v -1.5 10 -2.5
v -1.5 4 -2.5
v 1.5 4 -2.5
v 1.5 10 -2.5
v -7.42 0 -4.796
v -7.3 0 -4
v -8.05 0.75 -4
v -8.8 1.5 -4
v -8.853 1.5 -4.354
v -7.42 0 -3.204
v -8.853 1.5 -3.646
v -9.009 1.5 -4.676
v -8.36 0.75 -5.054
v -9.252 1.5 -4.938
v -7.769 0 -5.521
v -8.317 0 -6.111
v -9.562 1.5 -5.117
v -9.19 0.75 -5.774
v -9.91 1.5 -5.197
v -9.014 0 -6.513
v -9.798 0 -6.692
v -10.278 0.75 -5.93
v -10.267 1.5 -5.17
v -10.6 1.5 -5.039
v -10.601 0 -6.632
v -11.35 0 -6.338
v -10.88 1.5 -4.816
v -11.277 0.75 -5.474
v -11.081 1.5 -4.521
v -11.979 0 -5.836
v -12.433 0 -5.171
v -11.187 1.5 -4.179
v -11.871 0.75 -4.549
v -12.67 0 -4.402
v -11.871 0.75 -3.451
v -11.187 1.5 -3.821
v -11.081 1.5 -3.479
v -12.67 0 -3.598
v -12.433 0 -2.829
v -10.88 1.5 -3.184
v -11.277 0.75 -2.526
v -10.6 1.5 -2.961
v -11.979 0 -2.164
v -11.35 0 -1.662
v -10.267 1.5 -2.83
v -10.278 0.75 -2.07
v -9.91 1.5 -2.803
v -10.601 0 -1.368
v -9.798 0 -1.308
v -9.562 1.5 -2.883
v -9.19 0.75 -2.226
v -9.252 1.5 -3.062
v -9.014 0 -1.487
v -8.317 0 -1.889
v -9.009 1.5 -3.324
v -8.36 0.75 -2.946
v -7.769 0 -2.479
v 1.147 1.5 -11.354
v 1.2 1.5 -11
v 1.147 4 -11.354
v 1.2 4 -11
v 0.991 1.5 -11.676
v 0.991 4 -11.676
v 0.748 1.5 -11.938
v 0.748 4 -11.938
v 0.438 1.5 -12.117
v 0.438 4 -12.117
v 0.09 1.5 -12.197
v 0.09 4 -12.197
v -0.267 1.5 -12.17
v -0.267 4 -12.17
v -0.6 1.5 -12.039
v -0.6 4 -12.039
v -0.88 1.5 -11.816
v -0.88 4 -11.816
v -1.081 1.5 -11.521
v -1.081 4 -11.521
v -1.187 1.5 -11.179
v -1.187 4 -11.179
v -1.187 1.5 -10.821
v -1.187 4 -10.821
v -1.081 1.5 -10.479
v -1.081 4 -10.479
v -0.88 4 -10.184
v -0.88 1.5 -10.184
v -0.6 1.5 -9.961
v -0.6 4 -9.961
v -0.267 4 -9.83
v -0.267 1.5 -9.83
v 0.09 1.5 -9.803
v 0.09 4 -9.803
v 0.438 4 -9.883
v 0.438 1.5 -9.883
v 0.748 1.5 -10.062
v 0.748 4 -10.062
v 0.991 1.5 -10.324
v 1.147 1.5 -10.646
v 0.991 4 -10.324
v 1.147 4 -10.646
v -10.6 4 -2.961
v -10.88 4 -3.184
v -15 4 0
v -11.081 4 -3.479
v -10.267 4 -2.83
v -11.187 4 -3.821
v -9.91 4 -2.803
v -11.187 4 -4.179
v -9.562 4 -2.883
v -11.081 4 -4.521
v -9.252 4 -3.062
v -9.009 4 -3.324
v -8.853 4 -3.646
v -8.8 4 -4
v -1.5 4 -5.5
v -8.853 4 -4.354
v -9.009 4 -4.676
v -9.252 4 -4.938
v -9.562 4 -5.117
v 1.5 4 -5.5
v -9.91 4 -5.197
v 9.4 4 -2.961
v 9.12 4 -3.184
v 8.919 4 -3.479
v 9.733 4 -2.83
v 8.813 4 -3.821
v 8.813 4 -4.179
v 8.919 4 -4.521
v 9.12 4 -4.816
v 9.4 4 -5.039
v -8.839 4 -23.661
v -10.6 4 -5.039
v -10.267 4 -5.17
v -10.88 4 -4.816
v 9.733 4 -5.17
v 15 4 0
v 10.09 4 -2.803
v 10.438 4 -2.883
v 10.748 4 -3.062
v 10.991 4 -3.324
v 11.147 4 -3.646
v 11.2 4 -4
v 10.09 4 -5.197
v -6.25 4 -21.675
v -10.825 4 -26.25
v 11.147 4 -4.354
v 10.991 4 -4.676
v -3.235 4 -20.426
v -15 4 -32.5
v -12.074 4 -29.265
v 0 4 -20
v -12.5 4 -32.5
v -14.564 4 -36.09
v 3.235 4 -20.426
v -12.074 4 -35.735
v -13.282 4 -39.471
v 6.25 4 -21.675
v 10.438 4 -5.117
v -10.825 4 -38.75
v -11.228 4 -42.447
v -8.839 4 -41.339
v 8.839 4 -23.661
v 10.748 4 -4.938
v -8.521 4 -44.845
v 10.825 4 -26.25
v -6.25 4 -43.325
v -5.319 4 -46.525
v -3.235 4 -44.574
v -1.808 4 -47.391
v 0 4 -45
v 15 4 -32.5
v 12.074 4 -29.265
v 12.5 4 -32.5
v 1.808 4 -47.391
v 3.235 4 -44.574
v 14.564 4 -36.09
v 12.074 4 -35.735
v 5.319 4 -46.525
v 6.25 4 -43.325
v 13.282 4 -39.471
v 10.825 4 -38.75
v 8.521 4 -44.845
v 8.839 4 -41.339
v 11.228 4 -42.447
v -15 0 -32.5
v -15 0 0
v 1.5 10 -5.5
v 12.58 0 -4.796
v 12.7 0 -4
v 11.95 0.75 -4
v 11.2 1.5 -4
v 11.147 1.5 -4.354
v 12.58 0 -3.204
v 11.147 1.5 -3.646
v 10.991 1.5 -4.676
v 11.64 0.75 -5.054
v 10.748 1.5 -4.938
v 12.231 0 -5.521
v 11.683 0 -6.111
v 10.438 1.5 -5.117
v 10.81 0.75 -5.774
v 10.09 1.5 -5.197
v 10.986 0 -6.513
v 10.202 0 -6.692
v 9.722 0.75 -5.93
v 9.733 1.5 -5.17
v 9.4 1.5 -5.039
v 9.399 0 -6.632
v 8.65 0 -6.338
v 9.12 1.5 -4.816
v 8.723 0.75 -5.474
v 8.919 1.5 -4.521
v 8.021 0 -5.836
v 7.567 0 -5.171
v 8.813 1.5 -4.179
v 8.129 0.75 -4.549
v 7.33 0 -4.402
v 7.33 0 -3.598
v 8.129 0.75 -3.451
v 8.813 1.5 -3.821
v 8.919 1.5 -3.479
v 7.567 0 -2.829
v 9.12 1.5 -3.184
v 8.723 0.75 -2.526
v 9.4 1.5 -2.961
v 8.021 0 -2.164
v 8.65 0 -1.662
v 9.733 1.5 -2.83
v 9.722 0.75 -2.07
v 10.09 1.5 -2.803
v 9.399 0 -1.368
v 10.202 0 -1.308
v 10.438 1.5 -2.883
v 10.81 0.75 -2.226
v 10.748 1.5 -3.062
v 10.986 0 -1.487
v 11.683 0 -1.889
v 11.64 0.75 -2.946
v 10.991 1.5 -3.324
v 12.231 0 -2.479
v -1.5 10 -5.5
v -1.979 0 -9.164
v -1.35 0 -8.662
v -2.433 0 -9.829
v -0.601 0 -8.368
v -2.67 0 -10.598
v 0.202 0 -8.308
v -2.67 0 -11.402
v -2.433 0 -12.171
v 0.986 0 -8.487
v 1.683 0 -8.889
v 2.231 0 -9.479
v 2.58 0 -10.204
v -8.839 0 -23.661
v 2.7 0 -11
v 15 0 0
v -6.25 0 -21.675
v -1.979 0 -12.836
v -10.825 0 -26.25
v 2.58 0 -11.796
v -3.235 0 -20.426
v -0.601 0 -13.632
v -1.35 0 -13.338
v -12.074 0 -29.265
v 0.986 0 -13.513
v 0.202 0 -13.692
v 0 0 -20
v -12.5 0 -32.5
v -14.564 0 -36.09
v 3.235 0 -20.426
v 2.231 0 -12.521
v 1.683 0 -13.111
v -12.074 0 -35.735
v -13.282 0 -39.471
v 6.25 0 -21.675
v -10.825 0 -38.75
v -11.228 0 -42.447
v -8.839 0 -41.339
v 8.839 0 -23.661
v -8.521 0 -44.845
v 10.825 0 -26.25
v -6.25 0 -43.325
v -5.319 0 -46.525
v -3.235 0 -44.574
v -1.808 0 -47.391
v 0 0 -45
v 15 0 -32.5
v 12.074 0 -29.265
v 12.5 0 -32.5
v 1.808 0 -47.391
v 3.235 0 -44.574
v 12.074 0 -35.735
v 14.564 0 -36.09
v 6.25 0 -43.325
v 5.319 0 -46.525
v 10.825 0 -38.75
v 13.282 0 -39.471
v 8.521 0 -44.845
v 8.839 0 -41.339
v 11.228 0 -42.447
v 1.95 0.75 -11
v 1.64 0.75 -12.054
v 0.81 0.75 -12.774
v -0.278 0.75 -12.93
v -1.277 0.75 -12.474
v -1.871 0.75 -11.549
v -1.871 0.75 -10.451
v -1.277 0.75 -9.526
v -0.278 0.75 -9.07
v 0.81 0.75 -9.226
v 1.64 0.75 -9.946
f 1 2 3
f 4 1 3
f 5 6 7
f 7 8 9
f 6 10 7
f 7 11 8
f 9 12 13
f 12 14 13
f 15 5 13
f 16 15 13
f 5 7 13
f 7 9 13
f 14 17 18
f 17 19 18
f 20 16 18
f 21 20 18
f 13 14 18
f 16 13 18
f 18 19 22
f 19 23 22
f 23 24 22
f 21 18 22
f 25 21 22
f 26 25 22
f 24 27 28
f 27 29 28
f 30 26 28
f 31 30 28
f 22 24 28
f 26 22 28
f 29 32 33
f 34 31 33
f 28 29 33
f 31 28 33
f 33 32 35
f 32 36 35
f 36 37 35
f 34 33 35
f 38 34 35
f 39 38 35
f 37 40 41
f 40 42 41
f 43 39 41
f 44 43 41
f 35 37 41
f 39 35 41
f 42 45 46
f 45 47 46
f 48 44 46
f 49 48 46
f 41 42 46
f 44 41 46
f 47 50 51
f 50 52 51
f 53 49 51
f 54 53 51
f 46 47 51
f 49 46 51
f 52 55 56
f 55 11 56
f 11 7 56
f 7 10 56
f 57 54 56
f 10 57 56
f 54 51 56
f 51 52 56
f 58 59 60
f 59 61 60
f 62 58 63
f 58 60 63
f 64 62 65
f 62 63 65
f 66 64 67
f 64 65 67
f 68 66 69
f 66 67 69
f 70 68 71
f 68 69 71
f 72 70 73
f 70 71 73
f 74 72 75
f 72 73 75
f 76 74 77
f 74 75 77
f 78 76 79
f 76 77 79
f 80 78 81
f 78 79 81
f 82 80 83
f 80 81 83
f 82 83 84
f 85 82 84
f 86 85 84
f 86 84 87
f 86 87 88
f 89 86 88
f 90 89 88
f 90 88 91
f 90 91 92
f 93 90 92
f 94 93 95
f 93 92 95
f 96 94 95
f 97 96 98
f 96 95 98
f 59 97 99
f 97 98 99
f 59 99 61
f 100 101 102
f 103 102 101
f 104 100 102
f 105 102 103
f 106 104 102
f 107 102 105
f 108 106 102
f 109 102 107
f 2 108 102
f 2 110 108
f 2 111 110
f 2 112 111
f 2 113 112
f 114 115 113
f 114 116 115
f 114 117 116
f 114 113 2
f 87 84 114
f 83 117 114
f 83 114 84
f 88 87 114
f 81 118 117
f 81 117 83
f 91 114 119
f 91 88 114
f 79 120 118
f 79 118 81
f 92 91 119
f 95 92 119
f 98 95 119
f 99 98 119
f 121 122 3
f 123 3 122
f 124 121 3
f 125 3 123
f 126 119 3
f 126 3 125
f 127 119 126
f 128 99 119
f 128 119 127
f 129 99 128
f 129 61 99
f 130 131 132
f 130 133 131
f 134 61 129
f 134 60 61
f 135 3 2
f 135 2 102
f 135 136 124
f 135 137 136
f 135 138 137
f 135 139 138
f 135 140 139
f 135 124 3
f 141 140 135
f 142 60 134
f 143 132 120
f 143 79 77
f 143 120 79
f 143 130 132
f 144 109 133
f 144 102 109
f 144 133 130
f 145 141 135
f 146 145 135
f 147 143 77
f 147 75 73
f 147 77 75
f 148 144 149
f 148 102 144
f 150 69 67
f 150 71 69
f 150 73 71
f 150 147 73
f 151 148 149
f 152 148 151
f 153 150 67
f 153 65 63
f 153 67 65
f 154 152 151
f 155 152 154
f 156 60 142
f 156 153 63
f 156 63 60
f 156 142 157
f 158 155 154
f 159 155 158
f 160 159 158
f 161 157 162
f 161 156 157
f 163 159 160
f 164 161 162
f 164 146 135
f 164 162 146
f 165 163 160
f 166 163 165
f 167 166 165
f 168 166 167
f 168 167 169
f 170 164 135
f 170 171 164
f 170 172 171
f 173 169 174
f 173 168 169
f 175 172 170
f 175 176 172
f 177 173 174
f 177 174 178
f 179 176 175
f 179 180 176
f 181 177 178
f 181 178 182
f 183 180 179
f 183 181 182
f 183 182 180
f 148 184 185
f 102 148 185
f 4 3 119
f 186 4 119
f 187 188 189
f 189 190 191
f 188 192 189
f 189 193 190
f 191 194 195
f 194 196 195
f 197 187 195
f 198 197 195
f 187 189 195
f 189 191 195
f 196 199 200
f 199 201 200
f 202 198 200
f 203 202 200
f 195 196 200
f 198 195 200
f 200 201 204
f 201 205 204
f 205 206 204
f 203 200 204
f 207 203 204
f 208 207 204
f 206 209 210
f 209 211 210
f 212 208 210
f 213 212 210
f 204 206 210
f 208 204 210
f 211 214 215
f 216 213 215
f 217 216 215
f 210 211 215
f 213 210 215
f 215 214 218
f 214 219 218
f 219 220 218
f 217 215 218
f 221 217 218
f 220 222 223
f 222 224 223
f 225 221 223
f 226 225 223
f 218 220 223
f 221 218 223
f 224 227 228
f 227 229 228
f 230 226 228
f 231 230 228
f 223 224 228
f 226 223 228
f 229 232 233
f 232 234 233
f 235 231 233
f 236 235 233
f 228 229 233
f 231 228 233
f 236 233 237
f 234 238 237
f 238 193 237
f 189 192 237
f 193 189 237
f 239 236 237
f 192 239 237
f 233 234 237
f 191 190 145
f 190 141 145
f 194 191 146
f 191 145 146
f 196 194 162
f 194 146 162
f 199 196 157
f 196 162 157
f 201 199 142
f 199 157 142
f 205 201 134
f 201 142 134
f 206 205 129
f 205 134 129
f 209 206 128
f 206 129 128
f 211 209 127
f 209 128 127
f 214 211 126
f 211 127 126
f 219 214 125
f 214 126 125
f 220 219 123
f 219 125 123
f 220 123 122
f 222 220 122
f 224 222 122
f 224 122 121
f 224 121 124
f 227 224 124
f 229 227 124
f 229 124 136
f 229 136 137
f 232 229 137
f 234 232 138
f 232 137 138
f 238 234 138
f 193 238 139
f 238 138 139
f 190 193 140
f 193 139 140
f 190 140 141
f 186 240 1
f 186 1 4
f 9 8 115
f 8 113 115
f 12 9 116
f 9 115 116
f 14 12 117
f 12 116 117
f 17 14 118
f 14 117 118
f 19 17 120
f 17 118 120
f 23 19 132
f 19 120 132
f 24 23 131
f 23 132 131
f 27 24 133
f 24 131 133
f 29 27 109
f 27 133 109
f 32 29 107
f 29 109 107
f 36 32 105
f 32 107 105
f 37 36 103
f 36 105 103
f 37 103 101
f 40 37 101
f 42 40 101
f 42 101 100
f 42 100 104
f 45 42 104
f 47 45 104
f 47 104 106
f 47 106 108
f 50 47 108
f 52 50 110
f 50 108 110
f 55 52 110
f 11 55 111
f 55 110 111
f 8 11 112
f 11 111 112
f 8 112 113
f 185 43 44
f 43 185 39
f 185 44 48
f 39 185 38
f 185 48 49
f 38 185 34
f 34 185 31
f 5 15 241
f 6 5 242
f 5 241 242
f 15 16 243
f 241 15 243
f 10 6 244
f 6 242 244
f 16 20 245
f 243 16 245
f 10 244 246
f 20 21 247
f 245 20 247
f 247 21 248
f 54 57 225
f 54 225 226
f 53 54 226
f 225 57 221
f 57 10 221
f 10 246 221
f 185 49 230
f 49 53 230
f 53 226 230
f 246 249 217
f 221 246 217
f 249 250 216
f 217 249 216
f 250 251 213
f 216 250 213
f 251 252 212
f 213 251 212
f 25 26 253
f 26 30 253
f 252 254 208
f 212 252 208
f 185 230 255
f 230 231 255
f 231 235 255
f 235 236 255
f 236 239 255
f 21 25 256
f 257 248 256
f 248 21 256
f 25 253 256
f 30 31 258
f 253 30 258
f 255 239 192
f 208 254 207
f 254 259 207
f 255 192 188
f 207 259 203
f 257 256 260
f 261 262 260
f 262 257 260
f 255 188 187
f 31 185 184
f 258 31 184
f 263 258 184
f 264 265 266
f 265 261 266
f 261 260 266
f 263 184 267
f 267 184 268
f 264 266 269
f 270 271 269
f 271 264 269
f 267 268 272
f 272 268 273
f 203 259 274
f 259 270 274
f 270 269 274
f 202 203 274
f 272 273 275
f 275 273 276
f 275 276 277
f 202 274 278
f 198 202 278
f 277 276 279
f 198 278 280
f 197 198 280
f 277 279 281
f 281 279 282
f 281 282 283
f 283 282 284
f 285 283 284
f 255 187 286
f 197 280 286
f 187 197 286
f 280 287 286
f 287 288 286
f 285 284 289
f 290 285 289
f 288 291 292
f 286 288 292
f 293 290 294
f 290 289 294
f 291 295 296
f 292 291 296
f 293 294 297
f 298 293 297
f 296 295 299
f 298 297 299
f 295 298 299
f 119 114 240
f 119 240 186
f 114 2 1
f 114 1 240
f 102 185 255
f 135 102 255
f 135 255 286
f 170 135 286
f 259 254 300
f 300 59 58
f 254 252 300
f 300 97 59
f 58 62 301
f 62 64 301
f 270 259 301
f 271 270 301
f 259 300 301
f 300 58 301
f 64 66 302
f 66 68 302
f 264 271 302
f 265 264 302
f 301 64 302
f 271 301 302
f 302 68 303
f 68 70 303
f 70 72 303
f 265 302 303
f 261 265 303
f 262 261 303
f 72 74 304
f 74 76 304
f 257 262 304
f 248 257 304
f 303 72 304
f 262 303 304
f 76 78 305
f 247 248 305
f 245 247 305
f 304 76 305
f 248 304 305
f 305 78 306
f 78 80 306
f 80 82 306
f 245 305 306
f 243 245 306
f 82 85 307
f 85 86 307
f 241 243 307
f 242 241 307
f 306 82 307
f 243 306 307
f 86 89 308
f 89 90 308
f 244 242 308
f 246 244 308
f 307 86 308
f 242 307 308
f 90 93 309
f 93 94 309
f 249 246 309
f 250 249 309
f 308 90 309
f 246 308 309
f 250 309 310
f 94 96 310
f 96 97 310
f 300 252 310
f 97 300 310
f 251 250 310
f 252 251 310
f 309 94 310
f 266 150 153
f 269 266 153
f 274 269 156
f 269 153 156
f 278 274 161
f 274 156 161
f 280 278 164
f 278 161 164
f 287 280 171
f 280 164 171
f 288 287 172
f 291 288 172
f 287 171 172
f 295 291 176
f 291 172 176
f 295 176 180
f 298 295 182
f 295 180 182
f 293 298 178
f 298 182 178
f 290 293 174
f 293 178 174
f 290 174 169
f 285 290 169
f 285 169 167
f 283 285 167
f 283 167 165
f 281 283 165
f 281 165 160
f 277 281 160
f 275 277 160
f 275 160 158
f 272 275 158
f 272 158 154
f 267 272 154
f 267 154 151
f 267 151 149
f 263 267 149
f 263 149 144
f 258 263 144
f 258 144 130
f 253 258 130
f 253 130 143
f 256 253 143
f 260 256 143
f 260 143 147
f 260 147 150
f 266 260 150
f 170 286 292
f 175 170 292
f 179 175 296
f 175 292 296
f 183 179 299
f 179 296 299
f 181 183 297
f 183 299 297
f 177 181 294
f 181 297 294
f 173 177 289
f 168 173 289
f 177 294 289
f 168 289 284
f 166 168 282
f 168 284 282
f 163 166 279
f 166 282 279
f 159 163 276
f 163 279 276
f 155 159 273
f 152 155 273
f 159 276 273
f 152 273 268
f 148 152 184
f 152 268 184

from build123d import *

# Parameters (mm, degrees)
BOSS_EXTRUDE1_DEPTH                                 = 4
CUT_EXTRUDE1_REACH                                  = 51.972
SKETCH2_R                                           = 12.5
SKETCH3_W                                           = 3
SKETCH3_H                                           = 3
BOSS_EXTRUDE2_DEPTH                                 = 6
CSK_FOR_M2_COUNTERSUNK_FLAT_HEAD_SCREW1_D           = 2.4
CSK_FOR_M2_COUNTERSUNK_FLAT_HEAD_SCREW1_DEPTH       = 5.2
CSK_FOR_M2_COUNTERSUNK_FLAT_HEAD_SCREW1_CSINK_D     = 5.4
CSK_FOR_M2_COUNTERSUNK_FLAT_HEAD_SCREW1_CSINK_ANGLE = 90
CSK_FOR_M2_COUNTERSUNK_FLAT_HEAD_SCREW1_TIP         = 0.721032743


with BuildPart() as part:
    # Sketch1 → Boss-Extrude1 (new body)
    with BuildSketch(Plane(origin=(0, 0, 0), x_dir=(1, 0, 0), z_dir=(0, 1, 0))):
        with BuildLine():
            Line((-15, 0), (15, 0))
            Line((15, 0), (15, 32.5))
            ThreePointArc((15, 32.5), (0, 47.5), (-15, 32.5))
            Line((-15, 32.5), (-15, 0))
        make_face()
    extrude(amount=BOSS_EXTRUDE1_DEPTH)

    # Sketch2 → Cut-Extrude1 (cut, up to next)
    with BuildSketch(Plane(origin=(0, 4, 0), x_dir=(1, 0, 0), z_dir=(0, 1, 0)), mode=Mode.PRIVATE) as cut_extrude1_sk1:
        with Locations(Location((0, 32.5, 0), (0, 0, 270))):
            Circle(SKETCH2_R)
    cut_extrude1_tool1 = extrude(cut_extrude1_sk1.sketch, amount=-CUT_EXTRUDE1_REACH, mode=Mode.PRIVATE) & part.part
    add(cut_extrude1_tool1.solids().sort_by_distance((0, 4, -32.5))[0], mode=Mode.SUBTRACT)

    # Sketch3 → Boss-Extrude2 (add)
    with BuildSketch(Plane(origin=(0, 4, 0), x_dir=(1, 0, 0), z_dir=(0, 1, 0))):
        with Locations((0, 4)):
            Rectangle(SKETCH3_W, SKETCH3_H)
    extrude(amount=BOSS_EXTRUDE2_DEPTH)

    # CSK for M2 Countersunk Flat Head Screw1
    with Locations(Plane(origin=(0, 0, 0), x_dir=(-1, 0, 0), z_dir=(0, -1, 0))):
        with Locations((-10, 4), (10, 4), (0, 11)):
            CounterSinkHole(CSK_FOR_M2_COUNTERSUNK_FLAT_HEAD_SCREW1_D / 2, CSK_FOR_M2_COUNTERSUNK_FLAT_HEAD_SCREW1_CSINK_D / 2, depth=CSK_FOR_M2_COUNTERSUNK_FLAT_HEAD_SCREW1_DEPTH, counter_sink_angle=CSK_FOR_M2_COUNTERSUNK_FLAT_HEAD_SCREW1_CSINK_ANGLE)
            with Locations((0, 0, -(CSK_FOR_M2_COUNTERSUNK_FLAT_HEAD_SCREW1_DEPTH + CSK_FOR_M2_COUNTERSUNK_FLAT_HEAD_SCREW1_TIP / 2))):  # 118° drill point
                Cone(0, CSK_FOR_M2_COUNTERSUNK_FLAT_HEAD_SCREW1_D / 2, CSK_FOR_M2_COUNTERSUNK_FLAT_HEAD_SCREW1_TIP, mode=Mode.SUBTRACT)


solid = part.part
